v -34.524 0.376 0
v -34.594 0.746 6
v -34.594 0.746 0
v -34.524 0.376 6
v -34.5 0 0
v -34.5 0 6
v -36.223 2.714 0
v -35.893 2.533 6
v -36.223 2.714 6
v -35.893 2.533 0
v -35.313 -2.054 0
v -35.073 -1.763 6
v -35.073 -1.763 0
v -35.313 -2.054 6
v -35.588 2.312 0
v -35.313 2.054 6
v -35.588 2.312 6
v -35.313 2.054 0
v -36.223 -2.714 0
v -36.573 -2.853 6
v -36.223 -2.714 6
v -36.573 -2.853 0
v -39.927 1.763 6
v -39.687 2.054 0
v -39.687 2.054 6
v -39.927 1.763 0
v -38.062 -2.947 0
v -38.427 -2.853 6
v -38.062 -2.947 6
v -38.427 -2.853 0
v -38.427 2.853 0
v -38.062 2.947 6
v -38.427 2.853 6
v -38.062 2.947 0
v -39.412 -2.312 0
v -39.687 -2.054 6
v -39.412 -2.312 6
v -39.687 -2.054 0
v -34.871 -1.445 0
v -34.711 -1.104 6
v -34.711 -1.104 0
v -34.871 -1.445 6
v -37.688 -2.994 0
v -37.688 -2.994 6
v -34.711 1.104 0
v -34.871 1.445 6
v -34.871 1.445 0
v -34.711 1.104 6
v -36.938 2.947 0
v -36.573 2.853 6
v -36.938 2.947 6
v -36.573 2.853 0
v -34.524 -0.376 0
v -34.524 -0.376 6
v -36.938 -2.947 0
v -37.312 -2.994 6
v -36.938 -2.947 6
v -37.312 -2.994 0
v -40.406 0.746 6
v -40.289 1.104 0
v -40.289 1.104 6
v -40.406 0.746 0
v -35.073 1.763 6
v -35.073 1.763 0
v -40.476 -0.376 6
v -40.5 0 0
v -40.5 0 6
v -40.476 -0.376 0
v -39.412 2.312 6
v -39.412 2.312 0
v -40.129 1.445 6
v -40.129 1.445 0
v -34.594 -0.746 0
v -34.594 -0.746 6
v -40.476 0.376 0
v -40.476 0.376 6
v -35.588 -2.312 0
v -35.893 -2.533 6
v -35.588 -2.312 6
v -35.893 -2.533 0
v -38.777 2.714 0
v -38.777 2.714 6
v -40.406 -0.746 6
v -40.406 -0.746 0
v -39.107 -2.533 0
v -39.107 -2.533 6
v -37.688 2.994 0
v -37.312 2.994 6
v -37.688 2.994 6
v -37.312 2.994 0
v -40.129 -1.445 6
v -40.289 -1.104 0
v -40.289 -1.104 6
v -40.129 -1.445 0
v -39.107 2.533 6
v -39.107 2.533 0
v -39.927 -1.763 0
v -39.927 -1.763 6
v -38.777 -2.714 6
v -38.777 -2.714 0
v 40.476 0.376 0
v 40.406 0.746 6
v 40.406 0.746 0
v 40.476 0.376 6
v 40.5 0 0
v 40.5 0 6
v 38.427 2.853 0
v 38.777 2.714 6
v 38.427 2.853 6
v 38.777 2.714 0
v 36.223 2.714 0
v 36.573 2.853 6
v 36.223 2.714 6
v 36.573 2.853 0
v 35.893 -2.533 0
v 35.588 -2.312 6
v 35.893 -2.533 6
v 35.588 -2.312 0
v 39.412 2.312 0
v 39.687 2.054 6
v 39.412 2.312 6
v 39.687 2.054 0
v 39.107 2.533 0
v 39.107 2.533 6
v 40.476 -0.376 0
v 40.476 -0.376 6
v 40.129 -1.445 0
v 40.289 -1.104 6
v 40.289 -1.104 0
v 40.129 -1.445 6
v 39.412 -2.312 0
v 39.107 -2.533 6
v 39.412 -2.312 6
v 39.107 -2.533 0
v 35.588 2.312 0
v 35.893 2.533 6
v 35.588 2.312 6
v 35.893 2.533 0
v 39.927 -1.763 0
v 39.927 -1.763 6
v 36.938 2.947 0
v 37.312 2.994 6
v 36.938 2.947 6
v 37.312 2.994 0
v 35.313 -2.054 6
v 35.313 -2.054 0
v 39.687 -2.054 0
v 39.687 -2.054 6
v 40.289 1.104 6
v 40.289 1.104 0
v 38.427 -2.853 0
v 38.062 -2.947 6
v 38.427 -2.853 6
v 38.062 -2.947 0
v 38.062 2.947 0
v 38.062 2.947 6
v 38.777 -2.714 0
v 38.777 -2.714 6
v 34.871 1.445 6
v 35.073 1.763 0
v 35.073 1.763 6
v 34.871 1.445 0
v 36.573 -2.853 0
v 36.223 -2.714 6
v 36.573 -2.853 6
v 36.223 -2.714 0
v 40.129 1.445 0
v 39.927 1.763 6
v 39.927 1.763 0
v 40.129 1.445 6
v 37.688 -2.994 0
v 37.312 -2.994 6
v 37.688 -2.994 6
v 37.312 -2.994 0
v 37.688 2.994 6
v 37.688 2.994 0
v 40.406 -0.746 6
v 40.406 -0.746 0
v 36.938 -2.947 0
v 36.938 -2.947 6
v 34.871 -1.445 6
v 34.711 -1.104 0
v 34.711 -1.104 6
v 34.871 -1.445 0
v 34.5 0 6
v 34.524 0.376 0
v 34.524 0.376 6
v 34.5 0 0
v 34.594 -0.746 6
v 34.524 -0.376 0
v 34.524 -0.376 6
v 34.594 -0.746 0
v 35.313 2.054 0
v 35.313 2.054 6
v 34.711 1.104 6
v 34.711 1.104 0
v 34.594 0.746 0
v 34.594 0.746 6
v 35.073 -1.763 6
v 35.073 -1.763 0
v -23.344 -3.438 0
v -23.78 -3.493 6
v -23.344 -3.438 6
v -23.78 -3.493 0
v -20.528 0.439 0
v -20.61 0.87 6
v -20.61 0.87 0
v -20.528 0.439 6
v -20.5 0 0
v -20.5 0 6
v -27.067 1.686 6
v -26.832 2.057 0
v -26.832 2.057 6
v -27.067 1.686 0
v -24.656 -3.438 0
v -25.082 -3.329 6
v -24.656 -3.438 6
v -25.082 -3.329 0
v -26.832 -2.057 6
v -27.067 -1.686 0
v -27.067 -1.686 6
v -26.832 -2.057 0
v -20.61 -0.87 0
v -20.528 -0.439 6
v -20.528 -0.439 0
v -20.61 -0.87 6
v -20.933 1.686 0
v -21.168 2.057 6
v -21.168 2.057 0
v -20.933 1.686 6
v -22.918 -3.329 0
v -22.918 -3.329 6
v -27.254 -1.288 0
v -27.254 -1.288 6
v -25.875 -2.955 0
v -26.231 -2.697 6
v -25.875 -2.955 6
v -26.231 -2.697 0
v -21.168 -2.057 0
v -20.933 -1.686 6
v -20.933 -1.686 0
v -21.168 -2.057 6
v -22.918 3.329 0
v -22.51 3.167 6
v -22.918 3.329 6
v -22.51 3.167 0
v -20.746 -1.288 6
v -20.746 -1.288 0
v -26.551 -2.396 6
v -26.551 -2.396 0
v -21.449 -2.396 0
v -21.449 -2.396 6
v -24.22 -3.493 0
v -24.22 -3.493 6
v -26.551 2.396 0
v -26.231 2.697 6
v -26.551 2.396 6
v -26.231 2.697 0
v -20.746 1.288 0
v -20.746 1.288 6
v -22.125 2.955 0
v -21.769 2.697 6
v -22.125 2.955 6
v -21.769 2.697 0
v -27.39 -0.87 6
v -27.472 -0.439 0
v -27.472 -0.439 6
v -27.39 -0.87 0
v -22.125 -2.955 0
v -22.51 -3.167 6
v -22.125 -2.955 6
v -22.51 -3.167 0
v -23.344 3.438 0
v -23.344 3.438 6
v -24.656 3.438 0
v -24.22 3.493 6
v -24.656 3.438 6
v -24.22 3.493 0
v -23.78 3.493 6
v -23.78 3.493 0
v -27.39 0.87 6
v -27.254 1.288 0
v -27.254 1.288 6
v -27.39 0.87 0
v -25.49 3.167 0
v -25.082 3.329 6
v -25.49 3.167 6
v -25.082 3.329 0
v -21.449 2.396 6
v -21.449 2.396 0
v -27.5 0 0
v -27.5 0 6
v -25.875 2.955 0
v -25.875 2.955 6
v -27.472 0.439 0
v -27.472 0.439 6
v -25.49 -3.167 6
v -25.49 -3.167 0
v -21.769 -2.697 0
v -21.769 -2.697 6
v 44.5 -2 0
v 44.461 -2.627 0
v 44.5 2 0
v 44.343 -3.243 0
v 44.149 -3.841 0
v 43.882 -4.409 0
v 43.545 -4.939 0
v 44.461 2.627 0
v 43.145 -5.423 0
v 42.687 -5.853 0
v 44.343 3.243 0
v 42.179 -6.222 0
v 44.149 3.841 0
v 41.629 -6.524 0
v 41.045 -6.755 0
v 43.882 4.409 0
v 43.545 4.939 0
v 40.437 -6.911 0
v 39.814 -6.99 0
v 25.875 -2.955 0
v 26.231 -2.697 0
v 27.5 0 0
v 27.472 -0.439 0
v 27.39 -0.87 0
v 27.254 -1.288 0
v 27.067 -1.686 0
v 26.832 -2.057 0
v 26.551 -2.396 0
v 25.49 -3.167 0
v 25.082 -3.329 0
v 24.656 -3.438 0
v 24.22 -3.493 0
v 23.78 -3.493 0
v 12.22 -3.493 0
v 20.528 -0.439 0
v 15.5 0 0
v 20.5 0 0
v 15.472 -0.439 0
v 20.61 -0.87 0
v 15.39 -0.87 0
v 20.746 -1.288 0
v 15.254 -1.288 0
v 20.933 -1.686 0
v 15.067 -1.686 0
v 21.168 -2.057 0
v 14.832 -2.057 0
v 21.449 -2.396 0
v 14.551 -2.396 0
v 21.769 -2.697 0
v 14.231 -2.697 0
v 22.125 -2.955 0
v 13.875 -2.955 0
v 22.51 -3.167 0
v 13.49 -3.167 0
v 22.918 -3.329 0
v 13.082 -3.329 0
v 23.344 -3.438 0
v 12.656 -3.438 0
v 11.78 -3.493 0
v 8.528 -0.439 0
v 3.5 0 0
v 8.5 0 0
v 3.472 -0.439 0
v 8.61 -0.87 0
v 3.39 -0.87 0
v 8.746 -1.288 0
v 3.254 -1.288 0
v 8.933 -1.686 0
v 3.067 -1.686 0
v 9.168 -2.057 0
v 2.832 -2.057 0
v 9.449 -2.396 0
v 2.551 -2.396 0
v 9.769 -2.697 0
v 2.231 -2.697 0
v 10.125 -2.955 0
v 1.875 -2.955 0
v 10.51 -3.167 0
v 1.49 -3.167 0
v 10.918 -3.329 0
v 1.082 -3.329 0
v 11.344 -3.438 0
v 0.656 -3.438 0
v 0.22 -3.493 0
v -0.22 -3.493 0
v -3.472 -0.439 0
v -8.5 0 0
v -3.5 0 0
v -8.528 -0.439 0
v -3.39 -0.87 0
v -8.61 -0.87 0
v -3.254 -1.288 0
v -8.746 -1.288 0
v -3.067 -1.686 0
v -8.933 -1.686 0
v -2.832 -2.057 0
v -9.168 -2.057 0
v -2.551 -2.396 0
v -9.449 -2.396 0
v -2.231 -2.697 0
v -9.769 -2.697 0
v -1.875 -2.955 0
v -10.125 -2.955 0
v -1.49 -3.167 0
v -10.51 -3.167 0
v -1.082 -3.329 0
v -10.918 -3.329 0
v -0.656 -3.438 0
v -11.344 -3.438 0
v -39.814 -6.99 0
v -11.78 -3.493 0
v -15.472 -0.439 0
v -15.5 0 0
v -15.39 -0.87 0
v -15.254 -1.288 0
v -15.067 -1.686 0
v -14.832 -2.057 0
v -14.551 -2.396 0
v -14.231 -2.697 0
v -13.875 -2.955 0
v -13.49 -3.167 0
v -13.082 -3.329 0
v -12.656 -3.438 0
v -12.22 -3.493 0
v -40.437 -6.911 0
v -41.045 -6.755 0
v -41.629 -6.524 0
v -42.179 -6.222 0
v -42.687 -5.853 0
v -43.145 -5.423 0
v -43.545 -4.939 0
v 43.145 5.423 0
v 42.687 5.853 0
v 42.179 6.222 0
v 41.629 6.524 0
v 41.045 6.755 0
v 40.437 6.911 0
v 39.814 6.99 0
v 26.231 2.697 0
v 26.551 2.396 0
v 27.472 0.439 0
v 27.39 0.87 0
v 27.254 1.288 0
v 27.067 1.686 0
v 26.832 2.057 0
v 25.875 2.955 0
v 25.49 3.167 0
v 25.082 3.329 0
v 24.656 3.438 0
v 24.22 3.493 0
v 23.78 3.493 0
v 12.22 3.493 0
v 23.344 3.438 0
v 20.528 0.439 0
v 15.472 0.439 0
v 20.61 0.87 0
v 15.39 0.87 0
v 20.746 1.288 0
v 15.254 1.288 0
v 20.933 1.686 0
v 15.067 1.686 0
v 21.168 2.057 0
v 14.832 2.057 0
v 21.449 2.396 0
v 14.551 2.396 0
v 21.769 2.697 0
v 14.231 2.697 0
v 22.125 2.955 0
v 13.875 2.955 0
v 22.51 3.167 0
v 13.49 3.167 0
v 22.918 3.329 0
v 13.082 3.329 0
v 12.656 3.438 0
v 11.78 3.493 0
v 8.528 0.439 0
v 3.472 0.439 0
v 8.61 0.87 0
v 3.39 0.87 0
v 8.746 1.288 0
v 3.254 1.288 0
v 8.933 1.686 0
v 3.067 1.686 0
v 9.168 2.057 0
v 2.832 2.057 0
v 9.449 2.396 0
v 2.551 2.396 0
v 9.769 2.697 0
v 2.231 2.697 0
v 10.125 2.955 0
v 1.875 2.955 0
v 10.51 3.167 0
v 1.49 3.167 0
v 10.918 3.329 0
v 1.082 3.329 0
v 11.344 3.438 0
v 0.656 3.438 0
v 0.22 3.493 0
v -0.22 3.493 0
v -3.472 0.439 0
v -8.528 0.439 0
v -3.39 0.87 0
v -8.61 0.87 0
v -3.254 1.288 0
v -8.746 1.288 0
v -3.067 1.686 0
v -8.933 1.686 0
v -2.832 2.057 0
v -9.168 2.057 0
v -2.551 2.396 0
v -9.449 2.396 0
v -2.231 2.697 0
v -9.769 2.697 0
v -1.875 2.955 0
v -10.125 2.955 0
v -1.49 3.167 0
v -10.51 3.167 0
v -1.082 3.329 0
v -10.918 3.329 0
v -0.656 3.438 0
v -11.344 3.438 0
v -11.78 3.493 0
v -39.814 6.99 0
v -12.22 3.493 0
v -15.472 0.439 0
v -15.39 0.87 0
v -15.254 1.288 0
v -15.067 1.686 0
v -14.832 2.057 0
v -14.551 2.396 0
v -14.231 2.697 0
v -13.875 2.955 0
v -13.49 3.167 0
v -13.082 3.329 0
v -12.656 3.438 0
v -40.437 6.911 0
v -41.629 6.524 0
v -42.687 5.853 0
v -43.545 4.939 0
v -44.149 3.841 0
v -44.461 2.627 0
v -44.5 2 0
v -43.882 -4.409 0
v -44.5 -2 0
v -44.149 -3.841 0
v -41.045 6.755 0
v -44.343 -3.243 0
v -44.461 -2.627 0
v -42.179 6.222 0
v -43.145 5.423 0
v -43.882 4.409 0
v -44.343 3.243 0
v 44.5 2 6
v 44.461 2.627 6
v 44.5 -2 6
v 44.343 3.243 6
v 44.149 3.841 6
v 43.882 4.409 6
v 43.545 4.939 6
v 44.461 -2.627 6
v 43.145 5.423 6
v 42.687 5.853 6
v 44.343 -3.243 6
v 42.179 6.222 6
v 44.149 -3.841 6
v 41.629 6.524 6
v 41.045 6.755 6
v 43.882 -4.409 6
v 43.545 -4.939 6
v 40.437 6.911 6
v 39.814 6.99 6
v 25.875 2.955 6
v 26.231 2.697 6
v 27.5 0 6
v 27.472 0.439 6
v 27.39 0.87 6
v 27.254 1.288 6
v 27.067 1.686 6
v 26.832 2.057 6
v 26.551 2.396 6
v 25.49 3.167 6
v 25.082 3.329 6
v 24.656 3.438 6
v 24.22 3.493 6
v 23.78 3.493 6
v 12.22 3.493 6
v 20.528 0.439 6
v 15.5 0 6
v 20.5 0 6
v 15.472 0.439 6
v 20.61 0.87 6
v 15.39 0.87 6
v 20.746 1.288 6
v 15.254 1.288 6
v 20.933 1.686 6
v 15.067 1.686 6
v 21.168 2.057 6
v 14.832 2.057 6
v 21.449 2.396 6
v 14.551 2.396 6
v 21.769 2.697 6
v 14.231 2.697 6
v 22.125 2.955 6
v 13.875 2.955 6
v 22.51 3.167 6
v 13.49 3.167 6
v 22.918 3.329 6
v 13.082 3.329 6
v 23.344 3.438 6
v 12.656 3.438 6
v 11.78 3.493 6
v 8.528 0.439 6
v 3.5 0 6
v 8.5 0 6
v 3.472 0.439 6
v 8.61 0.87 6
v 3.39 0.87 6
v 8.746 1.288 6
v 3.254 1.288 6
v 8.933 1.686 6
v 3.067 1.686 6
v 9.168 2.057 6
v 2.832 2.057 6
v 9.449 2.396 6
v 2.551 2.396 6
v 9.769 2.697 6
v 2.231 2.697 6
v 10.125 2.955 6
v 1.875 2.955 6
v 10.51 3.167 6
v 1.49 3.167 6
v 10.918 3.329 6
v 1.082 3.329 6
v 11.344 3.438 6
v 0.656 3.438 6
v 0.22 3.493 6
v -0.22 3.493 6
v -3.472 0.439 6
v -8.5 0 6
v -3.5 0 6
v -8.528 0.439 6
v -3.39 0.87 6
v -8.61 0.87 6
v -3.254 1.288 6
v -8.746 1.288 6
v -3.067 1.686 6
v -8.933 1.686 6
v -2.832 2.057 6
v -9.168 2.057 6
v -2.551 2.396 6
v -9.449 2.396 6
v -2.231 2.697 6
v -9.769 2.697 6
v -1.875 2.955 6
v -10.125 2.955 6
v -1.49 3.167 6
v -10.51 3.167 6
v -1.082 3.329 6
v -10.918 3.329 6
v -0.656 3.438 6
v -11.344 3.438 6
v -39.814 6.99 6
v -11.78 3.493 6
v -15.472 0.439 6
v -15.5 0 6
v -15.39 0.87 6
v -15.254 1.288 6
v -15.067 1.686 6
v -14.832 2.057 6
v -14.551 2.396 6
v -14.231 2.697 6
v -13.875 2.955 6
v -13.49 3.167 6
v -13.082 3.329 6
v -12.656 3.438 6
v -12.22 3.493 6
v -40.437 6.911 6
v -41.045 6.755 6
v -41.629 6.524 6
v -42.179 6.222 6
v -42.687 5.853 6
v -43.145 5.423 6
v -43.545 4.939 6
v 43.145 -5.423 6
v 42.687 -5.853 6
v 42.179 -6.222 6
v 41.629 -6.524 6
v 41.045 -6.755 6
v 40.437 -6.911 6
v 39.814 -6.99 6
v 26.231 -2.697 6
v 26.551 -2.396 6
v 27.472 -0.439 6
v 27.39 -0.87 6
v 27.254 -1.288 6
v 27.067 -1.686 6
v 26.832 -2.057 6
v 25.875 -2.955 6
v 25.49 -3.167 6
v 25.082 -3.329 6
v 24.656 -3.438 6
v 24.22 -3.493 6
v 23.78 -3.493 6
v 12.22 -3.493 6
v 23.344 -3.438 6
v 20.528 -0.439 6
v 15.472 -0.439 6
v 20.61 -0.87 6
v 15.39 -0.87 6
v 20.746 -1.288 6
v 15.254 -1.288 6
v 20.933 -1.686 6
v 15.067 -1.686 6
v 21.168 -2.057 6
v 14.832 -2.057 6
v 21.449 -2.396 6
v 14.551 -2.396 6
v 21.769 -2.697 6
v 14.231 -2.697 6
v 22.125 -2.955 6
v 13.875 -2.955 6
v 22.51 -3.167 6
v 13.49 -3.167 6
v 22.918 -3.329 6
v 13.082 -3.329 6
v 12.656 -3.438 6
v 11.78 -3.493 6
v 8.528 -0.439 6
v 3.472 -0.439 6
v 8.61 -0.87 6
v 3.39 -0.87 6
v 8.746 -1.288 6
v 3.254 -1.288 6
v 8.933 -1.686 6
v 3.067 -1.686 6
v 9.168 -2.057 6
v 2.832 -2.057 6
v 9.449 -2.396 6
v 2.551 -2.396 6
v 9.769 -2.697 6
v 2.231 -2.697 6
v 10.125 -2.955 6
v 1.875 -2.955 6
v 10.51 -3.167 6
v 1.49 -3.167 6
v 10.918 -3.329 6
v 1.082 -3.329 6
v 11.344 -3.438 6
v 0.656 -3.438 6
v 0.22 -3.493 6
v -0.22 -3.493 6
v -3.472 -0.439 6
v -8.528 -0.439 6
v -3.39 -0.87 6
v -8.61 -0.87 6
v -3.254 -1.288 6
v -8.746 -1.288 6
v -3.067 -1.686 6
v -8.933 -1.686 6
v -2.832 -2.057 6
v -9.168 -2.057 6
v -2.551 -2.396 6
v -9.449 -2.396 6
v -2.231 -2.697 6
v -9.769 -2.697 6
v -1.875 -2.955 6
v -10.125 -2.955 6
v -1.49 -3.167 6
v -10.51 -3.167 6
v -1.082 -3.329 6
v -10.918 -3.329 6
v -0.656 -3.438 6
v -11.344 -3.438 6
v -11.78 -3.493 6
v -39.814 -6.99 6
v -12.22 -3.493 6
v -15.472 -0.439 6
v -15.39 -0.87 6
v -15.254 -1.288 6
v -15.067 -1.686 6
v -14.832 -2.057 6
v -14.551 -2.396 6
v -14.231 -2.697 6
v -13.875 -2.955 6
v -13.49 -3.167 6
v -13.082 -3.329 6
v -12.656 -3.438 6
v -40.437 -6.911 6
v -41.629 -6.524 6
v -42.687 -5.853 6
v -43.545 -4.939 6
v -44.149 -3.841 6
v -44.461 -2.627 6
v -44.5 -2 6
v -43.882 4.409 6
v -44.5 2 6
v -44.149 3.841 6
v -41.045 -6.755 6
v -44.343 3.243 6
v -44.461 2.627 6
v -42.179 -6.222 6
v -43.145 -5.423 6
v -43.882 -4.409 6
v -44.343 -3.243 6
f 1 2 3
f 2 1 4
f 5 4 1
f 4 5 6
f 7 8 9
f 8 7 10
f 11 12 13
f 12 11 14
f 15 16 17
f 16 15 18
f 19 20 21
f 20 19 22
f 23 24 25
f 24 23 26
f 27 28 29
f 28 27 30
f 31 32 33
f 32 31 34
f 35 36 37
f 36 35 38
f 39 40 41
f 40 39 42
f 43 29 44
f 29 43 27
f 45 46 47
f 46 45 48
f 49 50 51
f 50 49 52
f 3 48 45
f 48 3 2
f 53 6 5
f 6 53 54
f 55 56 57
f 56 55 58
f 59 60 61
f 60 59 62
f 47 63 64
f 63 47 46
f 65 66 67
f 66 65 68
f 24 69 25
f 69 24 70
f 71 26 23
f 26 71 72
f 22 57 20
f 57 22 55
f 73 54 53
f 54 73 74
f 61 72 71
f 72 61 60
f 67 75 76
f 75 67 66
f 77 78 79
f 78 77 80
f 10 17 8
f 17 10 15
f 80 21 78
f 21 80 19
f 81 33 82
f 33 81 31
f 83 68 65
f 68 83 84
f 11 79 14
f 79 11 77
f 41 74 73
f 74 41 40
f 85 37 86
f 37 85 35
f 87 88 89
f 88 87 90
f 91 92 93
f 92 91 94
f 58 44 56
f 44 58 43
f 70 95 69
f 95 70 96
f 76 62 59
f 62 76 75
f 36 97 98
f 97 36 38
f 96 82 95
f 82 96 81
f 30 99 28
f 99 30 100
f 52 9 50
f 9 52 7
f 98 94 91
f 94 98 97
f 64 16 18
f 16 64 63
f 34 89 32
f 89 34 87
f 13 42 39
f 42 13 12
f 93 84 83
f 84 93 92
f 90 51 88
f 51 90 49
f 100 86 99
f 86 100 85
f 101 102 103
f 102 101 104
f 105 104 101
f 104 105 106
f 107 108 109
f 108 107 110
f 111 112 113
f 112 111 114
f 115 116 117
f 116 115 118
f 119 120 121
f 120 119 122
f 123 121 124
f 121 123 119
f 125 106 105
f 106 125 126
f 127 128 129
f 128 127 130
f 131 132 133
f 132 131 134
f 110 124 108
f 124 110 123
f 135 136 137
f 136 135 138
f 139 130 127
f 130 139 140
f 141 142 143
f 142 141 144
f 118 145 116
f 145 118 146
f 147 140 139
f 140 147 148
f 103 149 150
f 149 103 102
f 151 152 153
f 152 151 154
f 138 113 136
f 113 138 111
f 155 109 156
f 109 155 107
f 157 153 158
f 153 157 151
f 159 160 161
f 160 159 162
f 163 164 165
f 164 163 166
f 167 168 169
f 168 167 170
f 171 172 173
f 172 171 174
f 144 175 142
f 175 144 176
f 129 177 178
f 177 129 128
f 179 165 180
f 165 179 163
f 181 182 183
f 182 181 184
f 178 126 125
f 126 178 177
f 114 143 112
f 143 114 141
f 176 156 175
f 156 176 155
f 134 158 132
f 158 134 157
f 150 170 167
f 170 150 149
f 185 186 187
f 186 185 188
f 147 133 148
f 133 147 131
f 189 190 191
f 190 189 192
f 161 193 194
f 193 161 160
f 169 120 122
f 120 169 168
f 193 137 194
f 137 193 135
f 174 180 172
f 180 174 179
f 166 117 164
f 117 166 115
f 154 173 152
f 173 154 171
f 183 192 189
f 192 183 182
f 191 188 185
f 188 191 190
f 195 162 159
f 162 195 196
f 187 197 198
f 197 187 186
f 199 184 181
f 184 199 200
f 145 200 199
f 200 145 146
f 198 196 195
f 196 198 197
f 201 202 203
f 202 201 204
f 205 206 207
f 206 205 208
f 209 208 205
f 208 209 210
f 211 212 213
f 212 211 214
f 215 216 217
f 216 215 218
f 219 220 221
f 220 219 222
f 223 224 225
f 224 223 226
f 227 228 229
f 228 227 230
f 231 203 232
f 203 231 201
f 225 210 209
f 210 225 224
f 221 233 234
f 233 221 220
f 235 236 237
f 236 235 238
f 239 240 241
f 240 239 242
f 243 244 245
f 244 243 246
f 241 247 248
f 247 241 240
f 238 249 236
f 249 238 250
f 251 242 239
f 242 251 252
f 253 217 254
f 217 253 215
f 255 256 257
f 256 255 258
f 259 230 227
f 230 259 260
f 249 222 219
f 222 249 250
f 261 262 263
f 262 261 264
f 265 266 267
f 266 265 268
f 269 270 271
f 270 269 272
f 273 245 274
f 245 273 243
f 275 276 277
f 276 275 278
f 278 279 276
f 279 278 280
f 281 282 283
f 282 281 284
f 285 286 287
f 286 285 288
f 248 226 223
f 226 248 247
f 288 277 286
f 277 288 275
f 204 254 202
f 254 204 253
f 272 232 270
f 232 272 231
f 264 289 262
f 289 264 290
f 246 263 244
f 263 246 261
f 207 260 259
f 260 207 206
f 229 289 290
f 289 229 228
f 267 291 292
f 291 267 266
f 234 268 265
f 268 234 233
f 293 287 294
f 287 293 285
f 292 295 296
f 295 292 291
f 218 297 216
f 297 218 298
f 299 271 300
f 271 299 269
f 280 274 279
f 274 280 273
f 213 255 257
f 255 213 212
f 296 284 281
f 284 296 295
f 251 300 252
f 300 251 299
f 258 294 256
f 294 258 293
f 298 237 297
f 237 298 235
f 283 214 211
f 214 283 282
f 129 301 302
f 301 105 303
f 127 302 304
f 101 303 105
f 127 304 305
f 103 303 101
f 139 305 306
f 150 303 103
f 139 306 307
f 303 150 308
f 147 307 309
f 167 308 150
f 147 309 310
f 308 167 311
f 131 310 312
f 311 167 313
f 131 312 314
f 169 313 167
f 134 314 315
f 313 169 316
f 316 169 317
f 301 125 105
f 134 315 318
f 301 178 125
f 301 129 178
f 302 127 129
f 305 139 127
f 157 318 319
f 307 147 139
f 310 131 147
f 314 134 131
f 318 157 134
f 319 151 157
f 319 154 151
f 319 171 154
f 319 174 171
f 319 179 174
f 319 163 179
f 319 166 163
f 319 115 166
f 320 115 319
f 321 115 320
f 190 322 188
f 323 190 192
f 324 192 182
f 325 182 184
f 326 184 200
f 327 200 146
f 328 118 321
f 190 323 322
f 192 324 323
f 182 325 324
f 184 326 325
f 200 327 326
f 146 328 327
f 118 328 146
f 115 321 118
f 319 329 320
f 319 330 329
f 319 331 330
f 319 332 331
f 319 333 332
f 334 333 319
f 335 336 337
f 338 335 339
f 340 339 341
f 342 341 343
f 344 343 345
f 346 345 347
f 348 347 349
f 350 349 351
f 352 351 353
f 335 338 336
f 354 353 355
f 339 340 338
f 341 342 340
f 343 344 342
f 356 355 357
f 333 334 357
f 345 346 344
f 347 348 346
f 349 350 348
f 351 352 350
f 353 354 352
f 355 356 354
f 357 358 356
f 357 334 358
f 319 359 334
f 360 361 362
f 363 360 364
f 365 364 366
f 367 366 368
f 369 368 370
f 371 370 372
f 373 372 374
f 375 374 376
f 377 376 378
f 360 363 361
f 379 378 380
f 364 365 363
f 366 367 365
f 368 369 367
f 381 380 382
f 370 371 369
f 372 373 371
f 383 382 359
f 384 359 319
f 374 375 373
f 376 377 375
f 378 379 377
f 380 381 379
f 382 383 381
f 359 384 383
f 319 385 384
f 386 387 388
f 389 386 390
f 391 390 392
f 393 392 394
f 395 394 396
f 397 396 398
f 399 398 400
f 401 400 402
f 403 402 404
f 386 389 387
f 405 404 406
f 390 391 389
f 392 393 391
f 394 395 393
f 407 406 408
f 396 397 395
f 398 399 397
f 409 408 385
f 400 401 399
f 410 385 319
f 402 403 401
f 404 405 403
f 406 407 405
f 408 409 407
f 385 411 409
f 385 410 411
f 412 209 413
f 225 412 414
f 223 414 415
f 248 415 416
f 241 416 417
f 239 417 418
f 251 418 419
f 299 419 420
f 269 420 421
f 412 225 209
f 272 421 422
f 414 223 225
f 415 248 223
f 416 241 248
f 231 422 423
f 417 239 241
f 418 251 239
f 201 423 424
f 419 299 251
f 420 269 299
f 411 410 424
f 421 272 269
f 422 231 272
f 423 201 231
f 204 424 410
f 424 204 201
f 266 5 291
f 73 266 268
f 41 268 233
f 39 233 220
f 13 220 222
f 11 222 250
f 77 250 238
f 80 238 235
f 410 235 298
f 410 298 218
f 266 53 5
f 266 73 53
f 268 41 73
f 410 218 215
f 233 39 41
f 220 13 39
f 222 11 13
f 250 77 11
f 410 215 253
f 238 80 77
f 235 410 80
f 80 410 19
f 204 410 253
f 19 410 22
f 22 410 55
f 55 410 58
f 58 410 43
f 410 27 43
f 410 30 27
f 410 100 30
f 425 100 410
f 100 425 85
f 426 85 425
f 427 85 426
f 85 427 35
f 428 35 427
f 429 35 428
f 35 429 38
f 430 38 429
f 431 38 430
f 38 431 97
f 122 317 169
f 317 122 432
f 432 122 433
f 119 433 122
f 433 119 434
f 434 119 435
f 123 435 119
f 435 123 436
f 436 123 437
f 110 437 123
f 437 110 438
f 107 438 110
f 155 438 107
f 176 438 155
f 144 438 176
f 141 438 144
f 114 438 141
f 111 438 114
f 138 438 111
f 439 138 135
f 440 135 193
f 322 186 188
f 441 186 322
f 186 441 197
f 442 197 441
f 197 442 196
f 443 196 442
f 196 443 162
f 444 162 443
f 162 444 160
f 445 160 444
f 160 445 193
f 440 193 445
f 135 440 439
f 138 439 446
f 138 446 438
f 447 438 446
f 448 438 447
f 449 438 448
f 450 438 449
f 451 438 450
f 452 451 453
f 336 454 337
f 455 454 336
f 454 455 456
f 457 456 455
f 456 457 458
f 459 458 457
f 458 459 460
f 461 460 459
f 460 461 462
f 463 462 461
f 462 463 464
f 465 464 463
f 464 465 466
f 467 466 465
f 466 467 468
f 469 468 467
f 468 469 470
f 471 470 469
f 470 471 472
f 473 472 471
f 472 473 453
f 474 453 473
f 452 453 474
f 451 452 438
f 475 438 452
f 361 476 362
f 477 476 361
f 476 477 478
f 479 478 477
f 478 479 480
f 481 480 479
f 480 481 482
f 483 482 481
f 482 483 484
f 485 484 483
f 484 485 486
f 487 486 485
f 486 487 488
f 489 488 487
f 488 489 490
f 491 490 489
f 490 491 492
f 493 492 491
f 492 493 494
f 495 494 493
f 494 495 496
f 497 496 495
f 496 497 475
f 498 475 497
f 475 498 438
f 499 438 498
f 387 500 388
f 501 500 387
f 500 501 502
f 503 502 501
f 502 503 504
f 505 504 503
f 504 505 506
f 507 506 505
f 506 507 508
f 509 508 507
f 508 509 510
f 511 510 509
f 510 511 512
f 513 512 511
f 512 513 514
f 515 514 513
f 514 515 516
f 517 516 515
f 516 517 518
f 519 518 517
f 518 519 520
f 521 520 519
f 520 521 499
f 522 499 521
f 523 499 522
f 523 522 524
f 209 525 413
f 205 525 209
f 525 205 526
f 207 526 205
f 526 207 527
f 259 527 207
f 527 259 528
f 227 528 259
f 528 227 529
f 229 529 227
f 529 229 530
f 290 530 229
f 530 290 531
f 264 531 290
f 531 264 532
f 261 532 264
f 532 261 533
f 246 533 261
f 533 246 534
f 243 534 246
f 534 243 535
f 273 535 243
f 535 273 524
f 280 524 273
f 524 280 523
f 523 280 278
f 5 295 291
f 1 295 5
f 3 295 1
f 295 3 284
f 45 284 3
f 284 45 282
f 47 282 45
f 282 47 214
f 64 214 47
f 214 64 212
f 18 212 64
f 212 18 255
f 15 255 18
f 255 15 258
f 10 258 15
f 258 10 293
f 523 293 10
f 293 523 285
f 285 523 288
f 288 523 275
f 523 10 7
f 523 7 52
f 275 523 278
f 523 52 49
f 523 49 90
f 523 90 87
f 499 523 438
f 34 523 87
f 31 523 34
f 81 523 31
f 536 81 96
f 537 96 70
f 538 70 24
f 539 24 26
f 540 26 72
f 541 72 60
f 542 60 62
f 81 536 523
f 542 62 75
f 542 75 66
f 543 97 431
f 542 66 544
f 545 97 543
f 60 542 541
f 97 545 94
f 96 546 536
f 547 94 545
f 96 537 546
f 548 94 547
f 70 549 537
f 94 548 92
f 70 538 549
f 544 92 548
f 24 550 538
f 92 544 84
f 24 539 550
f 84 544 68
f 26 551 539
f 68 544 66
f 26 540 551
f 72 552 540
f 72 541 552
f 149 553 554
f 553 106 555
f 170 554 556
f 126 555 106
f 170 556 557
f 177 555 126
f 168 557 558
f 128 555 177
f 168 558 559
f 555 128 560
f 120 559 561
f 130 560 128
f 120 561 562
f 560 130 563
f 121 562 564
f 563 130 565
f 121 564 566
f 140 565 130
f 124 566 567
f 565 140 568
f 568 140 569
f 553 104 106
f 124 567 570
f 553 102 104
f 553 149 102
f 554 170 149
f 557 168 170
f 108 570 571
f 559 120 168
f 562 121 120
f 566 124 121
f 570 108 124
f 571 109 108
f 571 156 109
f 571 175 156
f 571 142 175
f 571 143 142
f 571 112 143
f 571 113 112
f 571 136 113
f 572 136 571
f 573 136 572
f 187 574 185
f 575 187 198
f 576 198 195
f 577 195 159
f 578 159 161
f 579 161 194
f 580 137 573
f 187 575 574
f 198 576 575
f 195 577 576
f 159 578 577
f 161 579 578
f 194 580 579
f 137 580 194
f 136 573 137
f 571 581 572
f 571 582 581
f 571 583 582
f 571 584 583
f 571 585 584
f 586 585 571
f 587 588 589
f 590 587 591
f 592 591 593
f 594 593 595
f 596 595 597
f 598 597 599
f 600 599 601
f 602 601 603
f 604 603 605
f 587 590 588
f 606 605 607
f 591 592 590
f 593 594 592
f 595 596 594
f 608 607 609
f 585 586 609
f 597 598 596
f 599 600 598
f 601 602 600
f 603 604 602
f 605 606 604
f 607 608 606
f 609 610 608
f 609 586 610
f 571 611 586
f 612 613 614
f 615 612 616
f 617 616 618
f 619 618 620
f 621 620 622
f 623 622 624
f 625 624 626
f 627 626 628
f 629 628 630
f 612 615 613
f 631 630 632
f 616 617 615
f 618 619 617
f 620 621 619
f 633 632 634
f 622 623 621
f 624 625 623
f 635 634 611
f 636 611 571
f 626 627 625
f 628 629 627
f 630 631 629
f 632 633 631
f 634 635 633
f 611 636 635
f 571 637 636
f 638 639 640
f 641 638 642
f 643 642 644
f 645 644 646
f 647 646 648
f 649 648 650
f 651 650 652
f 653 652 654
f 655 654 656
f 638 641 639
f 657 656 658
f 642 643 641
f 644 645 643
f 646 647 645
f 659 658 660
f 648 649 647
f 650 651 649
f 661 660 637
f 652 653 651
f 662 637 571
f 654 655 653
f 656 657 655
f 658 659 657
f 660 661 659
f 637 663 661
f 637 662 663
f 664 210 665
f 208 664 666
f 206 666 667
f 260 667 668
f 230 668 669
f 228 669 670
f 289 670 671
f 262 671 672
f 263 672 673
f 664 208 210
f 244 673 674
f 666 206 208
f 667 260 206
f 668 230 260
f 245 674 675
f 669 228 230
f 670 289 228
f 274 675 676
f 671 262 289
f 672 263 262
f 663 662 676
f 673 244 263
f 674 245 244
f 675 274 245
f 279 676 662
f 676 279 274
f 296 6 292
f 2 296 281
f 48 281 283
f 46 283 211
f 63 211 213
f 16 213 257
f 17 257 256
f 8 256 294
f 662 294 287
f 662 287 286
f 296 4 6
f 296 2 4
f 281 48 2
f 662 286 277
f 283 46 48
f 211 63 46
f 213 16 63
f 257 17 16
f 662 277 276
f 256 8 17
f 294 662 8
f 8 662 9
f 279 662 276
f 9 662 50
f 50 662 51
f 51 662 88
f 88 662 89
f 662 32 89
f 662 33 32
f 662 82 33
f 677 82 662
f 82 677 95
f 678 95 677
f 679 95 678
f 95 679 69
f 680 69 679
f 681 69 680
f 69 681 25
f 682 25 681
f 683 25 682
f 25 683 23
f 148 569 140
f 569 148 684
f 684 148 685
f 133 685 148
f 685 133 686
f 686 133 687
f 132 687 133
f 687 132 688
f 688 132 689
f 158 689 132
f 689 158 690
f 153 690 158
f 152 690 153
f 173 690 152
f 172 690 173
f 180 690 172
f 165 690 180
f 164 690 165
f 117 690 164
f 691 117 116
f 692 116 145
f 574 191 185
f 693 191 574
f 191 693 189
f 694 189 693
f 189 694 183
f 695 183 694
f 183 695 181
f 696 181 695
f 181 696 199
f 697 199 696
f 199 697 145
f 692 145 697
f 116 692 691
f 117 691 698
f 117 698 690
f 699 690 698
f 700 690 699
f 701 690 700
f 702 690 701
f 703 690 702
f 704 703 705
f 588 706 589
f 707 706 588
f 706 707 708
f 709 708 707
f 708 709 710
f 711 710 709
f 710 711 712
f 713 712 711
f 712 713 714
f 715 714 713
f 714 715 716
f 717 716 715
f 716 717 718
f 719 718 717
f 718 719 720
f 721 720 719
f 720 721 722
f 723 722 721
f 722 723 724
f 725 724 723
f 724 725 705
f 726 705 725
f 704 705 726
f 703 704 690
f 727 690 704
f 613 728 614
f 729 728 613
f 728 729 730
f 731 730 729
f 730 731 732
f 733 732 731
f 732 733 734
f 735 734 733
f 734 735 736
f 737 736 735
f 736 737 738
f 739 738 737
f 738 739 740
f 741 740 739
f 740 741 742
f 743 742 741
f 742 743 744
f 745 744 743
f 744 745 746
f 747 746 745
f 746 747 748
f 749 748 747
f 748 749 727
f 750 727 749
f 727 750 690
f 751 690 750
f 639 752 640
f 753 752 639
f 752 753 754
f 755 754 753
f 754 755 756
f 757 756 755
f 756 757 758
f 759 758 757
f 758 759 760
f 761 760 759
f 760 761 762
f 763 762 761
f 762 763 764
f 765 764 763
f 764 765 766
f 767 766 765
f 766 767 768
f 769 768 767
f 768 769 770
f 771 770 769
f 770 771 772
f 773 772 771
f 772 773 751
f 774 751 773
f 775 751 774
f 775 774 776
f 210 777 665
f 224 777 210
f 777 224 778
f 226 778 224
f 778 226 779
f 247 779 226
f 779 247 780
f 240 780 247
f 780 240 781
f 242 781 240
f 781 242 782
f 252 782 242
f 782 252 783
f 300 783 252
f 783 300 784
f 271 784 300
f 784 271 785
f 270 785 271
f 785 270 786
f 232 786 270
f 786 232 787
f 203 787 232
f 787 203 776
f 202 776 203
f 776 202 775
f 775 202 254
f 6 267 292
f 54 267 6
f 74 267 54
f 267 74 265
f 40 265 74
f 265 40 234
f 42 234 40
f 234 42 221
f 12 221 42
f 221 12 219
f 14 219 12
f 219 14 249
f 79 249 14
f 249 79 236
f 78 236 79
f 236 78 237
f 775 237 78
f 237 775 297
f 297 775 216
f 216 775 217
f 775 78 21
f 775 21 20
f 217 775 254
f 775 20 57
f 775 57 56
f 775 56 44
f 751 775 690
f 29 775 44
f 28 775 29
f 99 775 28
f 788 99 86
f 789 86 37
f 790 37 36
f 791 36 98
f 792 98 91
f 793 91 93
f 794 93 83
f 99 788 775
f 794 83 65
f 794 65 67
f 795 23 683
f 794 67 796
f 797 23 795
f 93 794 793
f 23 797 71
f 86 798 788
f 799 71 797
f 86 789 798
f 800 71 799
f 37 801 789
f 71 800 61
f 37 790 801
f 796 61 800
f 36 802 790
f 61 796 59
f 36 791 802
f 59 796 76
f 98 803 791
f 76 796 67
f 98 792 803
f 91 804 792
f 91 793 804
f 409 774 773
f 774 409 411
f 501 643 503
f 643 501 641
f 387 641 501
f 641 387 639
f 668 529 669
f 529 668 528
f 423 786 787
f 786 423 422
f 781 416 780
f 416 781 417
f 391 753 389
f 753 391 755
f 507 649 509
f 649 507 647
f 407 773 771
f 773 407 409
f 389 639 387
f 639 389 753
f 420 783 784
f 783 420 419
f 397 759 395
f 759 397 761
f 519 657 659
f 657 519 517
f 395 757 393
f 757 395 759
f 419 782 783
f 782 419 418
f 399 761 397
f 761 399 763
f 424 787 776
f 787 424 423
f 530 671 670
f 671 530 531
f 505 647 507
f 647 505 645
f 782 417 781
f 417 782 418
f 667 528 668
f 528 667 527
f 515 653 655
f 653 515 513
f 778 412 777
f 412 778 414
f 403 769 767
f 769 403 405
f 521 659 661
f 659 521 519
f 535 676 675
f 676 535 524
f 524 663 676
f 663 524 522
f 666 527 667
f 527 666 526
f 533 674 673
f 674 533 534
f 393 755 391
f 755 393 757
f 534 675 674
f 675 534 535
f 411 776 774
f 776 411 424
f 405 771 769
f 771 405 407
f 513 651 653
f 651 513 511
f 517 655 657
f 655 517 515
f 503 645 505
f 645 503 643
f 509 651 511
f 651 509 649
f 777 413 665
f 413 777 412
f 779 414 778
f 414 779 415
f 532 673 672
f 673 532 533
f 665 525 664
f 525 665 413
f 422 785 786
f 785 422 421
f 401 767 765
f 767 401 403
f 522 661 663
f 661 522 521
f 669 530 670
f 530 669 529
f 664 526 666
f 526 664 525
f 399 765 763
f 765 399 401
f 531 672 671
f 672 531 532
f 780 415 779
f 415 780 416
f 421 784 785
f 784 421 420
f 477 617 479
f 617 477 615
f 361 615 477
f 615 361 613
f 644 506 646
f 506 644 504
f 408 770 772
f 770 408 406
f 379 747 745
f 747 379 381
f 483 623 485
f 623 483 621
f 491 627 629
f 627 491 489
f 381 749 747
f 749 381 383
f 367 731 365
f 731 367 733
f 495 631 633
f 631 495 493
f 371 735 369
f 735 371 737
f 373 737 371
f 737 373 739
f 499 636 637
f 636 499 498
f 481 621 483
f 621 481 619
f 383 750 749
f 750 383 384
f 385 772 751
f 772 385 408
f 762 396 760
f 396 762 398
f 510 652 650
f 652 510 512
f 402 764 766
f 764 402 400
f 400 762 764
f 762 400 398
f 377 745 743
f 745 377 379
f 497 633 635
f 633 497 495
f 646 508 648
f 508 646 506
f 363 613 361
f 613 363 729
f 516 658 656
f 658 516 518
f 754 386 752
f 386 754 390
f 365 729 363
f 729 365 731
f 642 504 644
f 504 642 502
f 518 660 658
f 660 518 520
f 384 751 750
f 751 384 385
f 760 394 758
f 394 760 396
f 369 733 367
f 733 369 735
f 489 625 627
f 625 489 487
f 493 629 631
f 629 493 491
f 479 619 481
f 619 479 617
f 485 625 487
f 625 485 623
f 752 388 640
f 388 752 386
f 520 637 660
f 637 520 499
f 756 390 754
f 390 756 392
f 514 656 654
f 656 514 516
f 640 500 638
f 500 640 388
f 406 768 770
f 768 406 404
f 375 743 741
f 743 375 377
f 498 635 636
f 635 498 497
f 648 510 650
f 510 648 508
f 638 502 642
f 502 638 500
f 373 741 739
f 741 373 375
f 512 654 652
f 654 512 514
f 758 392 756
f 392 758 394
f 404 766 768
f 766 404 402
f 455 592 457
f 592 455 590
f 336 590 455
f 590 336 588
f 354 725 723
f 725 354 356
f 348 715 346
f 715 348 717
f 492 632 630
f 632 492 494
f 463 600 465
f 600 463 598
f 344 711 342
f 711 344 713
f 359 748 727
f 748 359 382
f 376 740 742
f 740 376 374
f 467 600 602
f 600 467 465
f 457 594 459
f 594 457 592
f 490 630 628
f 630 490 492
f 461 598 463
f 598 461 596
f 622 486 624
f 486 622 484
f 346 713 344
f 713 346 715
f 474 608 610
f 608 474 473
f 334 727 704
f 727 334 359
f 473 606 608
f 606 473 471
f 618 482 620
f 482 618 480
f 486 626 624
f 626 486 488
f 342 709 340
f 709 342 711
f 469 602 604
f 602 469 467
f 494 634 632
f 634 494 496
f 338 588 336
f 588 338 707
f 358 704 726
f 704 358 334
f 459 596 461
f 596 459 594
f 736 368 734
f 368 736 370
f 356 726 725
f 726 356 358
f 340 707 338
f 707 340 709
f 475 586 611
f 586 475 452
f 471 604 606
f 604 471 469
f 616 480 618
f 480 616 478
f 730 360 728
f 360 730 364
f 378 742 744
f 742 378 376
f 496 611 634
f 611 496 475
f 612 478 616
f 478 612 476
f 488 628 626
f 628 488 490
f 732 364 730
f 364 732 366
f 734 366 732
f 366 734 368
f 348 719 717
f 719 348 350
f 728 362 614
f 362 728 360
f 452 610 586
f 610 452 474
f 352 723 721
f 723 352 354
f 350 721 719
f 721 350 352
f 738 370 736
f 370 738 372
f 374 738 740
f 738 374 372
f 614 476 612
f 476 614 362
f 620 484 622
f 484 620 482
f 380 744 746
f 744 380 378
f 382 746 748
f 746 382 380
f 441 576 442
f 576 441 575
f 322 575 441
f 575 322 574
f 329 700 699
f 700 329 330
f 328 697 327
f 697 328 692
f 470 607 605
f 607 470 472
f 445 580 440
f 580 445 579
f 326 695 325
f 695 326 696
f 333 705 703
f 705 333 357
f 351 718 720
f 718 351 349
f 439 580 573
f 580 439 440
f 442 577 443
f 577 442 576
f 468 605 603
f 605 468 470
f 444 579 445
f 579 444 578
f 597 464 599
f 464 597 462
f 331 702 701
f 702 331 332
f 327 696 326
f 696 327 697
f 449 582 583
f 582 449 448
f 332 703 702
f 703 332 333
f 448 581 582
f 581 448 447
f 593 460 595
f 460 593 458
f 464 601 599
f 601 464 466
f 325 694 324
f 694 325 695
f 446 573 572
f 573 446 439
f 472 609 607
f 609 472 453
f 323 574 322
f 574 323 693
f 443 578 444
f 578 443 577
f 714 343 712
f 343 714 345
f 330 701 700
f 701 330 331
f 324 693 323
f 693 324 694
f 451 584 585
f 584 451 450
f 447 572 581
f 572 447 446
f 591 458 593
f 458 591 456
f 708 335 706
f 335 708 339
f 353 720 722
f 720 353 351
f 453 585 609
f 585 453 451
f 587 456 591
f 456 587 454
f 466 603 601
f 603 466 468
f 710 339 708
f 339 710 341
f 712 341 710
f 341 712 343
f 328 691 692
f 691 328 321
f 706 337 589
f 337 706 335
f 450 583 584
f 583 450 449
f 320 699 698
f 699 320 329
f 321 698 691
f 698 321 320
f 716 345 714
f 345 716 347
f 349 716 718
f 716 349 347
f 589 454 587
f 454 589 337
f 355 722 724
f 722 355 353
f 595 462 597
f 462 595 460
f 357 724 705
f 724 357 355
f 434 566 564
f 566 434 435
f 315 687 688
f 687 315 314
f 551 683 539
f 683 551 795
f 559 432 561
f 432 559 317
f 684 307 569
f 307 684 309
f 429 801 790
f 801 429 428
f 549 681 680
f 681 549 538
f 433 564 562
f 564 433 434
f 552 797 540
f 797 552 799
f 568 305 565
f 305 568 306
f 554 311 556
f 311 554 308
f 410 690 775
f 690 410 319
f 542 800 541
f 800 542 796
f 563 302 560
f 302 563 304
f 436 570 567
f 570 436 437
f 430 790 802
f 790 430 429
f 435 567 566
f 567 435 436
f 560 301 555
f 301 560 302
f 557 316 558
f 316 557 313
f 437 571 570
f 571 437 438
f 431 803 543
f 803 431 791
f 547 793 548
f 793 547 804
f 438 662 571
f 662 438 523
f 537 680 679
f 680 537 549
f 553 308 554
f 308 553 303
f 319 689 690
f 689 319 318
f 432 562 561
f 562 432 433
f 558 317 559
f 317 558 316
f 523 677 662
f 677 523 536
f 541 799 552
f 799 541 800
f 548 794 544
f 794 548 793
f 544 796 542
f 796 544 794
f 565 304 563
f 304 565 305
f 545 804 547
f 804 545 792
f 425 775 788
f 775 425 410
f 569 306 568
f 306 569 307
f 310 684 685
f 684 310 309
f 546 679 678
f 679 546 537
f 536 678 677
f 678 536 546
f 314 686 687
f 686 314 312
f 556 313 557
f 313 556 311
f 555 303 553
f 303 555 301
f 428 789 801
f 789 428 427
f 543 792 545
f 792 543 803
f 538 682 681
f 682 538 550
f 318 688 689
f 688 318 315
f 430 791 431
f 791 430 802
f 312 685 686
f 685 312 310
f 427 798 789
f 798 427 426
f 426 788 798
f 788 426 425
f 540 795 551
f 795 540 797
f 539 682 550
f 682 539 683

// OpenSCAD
$fn = 50;


difference() {
	union() {
		hull() {
			translate(v = [-39.5000000000, 2.0000000000, 0]) {
				cylinder(h = 6, r = 5);
			}
			translate(v = [39.5000000000, 2.0000000000, 0]) {
				cylinder(h = 6, r = 5);
			}
			translate(v = [-39.5000000000, -2.0000000000, 0]) {
				cylinder(h = 6, r = 5);
			}
			translate(v = [39.5000000000, -2.0000000000, 0]) {
				cylinder(h = 6, r = 5);
			}
		}
	}
	union() {
		#translate(v = [-37.5000000000, 0.0000000000, 0]) {
			cylinder(h = 6, r = 3.0000000000);
		}
		#translate(v = [37.5000000000, 0.0000000000, 0]) {
			cylinder(h = 6, r = 3.0000000000);
		}
		#translate(v = [-37.5000000000, 0.0000000000, -100.0000000000]) {
			cylinder(h = 200, r = 3.0000000000);
		}
		#translate(v = [-37.5000000000, 0.0000000000, -100.0000000000]) {
			cylinder(h = 200, r = 3.0000000000);
		}
		#translate(v = [37.5000000000, 0.0000000000, -100.0000000000]) {
			cylinder(h = 200, r = 3.0000000000);
		}
		#translate(v = [37.5000000000, 0.0000000000, -100.0000000000]) {
			cylinder(h = 200, r = 3.0000000000);
		}
		#translate(v = [-37.5000000000, 0.0000000000, 0]) {
			cylinder(h = 6, r = 1.5000000000);
		}
		#translate(v = [37.5000000000, 0.0000000000, 0]) {
			cylinder(h = 6, r = 1.5000000000);
		}
		#translate(v = [-37.5000000000, 0.0000000000, 0]) {
			cylinder(h = 6, r = 1.5000000000);
		}
		#translate(v = [37.5000000000, 0.0000000000, 0]) {
			cylinder(h = 6, r = 1.5000000000);
		}
		#translate(v = [-37.5000000000, 0.0000000000, 0]) {
			cylinder(h = 6, r = 1.5000000000);
		}
		#translate(v = [37.5000000000, 0.0000000000, 0]) {
			cylinder(h = 6, r = 1.5000000000);
		}
		#translate(v = [-24.0000000000, 0, 0]) {
			cylinder(h = 6, r = 3.5000000000);
		}
		#translate(v = [-12.0000000000, 0, 0]) {
			cylinder(h = 6, r = 3.5000000000);
		}
		#cylinder(h = 6, r = 3.5000000000);
		#translate(v = [12.0000000000, 0, 0]) {
			cylinder(h = 6, r = 3.5000000000);
		}
		#translate(v = [24.0000000000, 0, 0]) {
			cylinder(h = 6, r = 3.5000000000);
		}
	}
}
